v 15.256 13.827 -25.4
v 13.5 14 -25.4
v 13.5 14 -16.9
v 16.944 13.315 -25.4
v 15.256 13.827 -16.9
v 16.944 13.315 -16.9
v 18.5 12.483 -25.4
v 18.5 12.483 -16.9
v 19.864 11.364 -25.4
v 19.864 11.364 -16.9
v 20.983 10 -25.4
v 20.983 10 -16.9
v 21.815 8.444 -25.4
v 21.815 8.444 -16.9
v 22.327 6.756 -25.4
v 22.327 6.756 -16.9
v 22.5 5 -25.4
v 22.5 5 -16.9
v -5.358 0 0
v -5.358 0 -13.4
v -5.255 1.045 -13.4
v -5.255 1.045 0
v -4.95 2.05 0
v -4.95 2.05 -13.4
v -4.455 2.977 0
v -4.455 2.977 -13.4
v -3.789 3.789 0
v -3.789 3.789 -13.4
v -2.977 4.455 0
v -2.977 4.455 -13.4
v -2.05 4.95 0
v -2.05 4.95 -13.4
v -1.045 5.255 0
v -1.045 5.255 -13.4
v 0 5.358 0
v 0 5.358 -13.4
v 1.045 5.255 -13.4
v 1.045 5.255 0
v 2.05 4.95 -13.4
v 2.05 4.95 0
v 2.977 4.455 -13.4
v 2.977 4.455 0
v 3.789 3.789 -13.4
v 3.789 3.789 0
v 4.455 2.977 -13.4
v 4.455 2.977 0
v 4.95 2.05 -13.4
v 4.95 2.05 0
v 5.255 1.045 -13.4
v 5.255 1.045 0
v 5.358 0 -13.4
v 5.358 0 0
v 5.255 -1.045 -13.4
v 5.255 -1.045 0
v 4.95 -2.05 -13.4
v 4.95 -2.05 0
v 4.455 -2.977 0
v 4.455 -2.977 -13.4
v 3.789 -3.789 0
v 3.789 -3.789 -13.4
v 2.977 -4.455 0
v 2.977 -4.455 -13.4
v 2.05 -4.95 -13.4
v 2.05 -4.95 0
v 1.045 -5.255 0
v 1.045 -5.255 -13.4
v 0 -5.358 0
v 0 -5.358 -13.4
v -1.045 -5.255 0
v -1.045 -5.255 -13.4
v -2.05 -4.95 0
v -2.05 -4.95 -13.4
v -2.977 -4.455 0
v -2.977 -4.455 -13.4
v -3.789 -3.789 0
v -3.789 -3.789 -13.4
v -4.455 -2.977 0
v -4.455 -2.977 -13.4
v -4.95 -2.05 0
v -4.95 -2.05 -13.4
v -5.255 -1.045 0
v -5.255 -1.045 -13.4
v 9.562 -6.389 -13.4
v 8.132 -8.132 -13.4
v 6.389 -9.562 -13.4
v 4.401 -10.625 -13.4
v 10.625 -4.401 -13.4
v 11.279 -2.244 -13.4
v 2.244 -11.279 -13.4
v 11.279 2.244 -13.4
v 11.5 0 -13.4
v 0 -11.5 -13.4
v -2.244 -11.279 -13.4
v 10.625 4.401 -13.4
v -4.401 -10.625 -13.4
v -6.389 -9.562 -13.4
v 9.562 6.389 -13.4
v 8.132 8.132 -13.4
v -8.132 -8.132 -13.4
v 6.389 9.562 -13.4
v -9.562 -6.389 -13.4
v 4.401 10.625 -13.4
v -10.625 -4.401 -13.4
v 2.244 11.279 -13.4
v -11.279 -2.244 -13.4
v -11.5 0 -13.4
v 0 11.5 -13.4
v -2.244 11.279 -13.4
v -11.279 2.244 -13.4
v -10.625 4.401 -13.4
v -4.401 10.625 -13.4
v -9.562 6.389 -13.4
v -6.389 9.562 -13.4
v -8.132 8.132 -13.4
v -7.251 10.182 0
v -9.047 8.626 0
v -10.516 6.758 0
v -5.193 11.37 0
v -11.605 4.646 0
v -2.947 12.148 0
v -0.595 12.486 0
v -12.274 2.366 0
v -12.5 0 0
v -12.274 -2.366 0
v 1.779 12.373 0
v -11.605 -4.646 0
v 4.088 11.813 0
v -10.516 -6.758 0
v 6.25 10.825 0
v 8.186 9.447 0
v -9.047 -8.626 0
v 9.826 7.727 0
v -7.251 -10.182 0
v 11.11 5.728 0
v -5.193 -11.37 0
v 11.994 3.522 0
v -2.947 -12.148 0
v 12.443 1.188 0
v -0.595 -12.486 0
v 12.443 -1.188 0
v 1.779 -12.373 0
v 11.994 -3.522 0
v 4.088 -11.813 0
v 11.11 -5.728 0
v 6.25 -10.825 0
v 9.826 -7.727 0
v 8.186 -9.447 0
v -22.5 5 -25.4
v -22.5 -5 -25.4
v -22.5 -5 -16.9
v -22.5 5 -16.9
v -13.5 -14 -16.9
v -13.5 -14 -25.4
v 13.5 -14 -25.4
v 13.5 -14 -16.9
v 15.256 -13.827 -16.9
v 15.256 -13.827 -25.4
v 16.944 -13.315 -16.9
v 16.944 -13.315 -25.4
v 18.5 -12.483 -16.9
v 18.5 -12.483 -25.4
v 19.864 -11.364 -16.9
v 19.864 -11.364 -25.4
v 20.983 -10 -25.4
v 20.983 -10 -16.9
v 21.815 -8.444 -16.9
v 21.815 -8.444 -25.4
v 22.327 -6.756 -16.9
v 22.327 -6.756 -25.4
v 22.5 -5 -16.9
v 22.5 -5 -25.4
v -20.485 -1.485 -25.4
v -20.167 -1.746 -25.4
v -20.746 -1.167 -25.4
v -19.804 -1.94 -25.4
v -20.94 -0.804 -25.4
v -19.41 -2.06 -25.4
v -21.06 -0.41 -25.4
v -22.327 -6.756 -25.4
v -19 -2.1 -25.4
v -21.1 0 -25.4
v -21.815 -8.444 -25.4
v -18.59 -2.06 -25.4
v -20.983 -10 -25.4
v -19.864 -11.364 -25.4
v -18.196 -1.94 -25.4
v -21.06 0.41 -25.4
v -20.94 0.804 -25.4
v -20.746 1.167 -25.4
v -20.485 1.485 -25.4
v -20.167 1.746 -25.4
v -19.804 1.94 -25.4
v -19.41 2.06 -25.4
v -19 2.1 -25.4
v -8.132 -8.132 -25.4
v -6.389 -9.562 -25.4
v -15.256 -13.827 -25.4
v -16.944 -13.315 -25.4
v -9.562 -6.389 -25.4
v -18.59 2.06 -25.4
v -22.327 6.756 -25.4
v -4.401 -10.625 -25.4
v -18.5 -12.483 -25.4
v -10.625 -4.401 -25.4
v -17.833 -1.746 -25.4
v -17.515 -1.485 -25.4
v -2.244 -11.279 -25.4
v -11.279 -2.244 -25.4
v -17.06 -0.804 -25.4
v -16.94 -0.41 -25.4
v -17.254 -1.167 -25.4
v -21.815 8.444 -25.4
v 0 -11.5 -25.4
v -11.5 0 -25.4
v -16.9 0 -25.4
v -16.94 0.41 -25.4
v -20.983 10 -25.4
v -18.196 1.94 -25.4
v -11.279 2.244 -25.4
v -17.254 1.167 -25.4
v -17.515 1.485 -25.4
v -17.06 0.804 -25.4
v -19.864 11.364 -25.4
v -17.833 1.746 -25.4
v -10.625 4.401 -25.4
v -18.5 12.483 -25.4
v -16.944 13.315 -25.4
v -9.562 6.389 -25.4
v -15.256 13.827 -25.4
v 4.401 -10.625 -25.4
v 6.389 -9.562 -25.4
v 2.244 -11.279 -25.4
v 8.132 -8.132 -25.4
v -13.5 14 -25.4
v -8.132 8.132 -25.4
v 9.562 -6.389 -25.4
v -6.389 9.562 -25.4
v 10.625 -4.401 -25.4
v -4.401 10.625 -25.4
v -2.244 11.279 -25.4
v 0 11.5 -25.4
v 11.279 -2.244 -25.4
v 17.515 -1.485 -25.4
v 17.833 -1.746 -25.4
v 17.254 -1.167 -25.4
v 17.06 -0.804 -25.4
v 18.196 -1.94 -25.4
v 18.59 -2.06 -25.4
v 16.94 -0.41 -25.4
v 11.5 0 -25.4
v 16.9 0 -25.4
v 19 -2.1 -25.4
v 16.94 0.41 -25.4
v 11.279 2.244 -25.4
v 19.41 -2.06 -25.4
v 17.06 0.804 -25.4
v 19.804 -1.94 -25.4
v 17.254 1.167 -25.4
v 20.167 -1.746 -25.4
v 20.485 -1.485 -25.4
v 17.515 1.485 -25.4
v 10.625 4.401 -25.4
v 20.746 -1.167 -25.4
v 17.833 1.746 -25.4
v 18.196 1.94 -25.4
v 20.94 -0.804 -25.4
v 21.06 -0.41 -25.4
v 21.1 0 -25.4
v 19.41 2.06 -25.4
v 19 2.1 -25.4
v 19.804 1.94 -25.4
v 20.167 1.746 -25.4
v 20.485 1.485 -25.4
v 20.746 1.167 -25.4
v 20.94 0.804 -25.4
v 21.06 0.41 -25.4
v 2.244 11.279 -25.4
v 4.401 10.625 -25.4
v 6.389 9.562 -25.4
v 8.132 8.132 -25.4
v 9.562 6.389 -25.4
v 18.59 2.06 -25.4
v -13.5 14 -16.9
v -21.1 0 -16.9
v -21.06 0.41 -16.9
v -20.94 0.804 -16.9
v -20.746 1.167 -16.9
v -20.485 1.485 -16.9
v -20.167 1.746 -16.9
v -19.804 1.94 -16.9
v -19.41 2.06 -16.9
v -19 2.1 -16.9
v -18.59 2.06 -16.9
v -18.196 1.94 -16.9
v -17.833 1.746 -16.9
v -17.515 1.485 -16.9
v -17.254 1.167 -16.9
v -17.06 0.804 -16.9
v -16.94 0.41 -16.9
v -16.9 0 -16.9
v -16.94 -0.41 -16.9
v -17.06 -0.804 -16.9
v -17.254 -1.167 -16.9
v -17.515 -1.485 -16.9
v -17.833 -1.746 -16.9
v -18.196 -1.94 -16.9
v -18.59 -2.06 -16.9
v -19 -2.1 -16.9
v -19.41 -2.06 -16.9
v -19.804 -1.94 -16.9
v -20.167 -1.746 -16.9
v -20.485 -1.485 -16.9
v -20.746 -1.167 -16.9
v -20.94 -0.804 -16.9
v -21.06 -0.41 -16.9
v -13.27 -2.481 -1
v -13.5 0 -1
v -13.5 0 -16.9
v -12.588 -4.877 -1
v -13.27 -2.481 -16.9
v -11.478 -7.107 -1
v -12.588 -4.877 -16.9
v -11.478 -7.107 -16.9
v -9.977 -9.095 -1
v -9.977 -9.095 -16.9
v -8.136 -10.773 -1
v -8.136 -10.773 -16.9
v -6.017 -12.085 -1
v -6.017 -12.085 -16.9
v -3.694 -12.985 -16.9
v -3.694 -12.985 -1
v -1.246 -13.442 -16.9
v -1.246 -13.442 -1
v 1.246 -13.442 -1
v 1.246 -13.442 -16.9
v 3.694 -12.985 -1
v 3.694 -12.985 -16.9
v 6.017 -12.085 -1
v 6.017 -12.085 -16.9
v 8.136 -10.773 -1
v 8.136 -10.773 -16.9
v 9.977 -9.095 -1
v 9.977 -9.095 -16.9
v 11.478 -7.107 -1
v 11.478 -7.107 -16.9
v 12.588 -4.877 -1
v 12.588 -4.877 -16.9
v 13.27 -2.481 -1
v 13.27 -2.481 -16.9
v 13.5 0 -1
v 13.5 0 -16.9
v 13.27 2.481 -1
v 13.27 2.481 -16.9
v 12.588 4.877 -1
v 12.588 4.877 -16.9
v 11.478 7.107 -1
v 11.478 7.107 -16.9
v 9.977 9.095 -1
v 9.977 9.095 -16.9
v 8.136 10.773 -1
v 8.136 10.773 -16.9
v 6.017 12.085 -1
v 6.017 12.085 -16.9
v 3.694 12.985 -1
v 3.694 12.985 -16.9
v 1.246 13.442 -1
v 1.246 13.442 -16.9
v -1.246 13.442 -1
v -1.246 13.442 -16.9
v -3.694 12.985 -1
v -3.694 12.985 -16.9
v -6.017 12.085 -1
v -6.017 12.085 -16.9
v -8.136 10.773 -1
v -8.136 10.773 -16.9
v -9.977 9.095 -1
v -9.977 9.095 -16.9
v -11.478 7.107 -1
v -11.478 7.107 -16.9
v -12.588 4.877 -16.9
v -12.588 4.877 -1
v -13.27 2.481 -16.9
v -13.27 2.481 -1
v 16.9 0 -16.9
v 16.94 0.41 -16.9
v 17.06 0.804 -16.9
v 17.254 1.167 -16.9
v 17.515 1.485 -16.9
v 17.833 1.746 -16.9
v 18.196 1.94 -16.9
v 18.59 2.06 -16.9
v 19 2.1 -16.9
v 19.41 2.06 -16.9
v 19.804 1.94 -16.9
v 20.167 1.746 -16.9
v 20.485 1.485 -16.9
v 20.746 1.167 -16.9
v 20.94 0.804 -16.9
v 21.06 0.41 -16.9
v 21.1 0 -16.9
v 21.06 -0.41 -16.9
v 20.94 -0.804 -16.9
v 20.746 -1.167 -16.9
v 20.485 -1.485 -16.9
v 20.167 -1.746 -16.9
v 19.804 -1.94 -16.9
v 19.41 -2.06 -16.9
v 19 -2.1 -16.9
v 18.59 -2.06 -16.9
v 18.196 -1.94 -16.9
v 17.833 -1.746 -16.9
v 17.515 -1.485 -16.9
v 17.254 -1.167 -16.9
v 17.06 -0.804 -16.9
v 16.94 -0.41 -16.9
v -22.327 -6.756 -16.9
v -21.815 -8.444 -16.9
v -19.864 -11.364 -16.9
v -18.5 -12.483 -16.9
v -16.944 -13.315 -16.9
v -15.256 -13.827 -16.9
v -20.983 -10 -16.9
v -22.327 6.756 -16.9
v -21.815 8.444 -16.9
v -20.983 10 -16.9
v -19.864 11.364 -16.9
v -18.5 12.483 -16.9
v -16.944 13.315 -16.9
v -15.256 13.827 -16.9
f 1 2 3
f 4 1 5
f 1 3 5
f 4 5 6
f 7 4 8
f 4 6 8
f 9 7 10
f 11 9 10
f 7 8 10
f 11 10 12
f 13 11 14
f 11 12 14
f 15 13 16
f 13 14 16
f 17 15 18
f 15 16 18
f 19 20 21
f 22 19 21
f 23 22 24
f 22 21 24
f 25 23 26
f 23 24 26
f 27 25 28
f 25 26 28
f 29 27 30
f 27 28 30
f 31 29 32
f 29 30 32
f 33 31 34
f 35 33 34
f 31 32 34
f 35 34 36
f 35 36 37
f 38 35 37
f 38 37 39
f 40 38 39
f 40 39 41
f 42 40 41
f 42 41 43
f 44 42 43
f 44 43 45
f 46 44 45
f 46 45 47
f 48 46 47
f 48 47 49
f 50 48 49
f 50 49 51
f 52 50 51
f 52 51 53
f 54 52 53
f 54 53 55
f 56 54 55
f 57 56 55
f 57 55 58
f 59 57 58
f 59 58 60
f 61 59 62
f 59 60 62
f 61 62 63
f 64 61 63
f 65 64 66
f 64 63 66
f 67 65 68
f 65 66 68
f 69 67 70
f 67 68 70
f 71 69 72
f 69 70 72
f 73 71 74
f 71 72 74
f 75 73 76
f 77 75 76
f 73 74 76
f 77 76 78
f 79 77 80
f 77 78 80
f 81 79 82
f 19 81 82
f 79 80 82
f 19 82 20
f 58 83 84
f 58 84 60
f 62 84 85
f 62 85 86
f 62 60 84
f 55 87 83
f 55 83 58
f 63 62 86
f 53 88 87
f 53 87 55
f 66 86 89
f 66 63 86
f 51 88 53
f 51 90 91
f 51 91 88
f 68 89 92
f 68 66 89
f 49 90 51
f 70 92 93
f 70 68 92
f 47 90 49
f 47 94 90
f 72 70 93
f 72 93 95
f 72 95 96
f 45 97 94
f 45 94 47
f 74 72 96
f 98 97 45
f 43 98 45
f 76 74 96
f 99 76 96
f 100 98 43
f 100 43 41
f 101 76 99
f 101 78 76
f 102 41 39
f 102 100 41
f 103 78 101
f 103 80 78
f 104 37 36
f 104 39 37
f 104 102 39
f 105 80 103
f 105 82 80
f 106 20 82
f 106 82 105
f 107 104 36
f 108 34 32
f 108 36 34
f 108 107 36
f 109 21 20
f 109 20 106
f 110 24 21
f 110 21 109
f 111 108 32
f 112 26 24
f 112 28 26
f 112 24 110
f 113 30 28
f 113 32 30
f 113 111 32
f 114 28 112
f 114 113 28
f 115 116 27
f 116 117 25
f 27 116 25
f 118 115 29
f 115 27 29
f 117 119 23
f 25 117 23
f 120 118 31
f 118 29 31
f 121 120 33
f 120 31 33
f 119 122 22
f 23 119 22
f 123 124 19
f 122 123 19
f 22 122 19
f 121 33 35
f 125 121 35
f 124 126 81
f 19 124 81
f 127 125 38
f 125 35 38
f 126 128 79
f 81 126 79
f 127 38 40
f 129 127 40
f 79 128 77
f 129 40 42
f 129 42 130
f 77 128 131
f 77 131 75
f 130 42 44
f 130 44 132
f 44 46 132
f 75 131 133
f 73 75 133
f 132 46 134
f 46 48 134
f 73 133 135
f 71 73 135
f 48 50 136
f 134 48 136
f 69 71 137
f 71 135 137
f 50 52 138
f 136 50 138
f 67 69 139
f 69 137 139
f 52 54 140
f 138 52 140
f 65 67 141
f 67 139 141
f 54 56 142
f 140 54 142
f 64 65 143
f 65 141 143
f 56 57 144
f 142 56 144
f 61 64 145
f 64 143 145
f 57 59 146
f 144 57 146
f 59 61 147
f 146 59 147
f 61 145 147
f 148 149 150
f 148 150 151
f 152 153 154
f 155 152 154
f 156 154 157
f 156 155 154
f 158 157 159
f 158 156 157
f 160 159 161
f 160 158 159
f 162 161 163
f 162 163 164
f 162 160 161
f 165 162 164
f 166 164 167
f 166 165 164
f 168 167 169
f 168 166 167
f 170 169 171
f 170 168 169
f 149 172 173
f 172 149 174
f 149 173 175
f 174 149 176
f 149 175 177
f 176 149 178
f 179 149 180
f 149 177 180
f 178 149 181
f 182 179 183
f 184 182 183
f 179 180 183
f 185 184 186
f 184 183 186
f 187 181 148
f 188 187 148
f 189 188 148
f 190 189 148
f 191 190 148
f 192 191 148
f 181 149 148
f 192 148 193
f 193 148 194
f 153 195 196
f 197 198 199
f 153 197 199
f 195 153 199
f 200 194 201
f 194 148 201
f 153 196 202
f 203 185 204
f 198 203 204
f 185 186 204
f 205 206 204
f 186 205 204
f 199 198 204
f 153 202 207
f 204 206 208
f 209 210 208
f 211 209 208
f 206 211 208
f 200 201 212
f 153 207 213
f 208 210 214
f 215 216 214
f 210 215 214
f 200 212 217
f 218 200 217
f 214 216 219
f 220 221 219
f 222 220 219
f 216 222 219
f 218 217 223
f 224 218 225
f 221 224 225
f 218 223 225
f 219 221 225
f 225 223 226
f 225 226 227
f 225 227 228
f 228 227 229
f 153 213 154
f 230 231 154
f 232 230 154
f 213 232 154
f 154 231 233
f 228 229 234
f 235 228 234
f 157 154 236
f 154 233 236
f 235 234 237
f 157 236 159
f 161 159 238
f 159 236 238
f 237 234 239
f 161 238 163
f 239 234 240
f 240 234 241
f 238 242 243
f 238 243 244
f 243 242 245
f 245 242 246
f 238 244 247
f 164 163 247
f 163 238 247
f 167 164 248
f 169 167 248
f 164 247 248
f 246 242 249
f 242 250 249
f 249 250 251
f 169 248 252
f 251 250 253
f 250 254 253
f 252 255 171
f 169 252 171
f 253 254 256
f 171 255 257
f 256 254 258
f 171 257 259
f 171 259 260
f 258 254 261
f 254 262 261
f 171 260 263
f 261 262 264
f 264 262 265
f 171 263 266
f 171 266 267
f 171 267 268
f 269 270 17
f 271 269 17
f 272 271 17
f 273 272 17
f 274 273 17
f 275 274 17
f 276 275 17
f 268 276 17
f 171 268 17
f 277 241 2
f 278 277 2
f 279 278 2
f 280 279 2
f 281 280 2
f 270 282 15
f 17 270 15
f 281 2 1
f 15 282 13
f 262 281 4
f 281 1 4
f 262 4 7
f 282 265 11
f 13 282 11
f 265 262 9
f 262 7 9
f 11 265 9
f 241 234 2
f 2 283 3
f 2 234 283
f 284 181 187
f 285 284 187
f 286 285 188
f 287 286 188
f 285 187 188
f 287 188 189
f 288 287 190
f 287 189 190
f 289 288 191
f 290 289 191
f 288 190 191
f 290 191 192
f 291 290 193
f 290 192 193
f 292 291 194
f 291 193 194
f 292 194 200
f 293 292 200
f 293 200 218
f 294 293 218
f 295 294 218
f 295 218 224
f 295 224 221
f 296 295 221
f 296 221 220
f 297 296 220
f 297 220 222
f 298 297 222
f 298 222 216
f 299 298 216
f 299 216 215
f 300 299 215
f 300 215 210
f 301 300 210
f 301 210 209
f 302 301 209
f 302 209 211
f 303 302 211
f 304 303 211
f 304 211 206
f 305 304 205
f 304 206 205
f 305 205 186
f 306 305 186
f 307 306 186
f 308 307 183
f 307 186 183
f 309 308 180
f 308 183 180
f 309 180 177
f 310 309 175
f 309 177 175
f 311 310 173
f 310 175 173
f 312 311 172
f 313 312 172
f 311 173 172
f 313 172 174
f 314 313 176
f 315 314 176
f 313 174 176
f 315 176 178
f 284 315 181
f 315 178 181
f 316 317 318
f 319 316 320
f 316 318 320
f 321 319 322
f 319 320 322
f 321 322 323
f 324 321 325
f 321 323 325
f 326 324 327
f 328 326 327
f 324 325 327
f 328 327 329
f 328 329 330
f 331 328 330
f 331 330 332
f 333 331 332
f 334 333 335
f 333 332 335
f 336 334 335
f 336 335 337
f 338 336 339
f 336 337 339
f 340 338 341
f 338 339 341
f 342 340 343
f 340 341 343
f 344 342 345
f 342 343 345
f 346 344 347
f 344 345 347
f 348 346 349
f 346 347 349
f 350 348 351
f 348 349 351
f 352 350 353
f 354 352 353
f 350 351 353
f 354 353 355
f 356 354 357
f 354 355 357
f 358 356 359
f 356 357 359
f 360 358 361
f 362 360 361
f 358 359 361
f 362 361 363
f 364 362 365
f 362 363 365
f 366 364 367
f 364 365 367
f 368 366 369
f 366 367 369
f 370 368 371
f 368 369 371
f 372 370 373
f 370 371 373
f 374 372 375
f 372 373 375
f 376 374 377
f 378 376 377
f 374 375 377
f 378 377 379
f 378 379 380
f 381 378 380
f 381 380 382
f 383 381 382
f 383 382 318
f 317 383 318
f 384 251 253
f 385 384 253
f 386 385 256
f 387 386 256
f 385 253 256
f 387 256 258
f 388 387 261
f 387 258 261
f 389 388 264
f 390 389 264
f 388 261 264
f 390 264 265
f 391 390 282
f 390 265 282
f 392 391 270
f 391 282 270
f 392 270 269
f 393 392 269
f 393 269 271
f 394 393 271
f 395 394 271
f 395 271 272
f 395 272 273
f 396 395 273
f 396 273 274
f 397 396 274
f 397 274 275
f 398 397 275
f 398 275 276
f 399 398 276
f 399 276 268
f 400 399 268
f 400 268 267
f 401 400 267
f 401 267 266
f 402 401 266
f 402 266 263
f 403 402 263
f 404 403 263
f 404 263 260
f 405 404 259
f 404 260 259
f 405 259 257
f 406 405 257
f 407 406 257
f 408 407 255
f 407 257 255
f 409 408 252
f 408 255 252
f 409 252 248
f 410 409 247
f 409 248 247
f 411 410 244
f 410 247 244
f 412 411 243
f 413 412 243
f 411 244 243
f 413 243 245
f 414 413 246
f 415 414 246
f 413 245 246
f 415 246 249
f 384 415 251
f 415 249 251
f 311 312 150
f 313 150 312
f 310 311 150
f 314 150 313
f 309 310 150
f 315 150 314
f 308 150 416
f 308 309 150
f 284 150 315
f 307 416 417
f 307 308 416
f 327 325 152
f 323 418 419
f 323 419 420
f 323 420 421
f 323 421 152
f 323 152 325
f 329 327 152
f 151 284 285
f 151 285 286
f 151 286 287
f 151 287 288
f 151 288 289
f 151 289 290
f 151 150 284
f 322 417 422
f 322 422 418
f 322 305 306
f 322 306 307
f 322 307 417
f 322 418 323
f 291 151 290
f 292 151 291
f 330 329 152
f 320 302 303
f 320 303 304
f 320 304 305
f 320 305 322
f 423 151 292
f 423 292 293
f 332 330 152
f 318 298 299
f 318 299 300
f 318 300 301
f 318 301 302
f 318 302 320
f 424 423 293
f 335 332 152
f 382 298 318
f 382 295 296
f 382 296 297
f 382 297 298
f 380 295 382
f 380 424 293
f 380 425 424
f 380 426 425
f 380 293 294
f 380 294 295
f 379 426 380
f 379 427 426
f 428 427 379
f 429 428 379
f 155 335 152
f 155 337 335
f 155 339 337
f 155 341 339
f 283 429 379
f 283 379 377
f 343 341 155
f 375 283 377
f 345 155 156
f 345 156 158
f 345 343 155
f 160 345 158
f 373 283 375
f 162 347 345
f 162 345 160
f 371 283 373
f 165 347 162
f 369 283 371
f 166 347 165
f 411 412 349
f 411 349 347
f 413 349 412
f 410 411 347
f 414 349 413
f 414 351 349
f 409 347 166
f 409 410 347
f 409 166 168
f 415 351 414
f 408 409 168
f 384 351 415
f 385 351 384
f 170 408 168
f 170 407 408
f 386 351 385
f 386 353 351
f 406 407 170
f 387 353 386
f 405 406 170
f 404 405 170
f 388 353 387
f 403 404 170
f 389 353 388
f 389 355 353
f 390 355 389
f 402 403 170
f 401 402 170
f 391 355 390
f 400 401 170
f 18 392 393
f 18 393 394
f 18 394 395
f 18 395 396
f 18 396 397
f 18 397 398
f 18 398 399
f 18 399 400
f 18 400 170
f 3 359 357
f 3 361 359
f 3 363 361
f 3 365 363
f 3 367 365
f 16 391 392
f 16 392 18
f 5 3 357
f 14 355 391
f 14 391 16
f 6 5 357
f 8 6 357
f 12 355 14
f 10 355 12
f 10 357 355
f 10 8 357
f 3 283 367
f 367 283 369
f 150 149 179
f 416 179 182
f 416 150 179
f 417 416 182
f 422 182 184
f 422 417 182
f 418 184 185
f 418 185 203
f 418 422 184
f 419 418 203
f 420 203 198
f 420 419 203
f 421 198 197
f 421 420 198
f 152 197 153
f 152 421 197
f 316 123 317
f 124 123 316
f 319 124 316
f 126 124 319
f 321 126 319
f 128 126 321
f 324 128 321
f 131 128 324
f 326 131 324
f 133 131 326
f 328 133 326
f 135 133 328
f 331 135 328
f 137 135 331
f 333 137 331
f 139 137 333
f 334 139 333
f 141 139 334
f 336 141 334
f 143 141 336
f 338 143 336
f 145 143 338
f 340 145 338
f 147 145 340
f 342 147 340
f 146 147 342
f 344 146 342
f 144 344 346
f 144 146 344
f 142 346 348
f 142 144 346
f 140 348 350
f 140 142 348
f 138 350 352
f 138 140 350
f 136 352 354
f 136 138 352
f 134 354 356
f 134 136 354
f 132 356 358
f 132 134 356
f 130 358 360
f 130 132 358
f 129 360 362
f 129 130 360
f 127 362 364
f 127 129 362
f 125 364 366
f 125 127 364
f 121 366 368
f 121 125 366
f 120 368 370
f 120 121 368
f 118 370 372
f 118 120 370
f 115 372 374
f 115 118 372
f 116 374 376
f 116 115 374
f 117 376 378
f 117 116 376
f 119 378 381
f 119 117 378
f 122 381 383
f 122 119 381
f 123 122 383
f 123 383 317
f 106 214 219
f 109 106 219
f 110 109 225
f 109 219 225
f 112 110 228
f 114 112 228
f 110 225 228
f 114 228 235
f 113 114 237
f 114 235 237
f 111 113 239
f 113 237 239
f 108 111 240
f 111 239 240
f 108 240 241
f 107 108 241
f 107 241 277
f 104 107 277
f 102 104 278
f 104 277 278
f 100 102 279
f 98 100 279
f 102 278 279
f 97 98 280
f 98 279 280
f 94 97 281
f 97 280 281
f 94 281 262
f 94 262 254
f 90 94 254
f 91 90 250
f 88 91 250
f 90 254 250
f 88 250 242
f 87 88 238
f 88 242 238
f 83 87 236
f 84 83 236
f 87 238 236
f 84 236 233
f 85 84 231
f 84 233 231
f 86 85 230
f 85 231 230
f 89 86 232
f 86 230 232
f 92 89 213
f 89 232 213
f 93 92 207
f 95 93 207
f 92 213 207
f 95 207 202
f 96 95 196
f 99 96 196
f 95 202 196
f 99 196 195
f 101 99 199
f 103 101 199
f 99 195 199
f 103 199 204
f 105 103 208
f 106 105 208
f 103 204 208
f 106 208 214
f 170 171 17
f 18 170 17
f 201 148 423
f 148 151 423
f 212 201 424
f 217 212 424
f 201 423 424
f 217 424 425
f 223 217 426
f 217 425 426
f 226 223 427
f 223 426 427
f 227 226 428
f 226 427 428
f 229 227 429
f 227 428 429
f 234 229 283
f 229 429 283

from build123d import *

# Parameters (mm, degrees)
F_1_2_13_TAPPED_HOLE1_D     = 10.71626
BOSS_EXTRUDE1_START         = -8.5
SKETCH9_W                   = 45
SKETCH9_H                   = 28
SKETCH9_R                   = 13.5
BOSS_EXTRUDE1_DEPTH         = 8.5
TAP_DRILL_FOR_M5X0_8_TAP1_D = 4.2
FILLET1_R                   = 9
CHAMFER1_SIZE               = 1
SKETCH8_R                   = 11.5
CUT_EXTRUDE2_DEPTH          = 12


with BuildPart() as part:
    # Sketch2 → Revolve1 (revolve)
    with BuildSketch(Plane(origin=(0, 0, 0), x_dir=(0, 0, -1), z_dir=(1, 0, 0)), mode=Mode.PRIVATE) as revolve1_sk:
        Polygon((0, 13.5), (16.9, 13.5), (16.9, 14), (25.4, 14), (25.4, 0), (0, 0), align=None)
    revolve(revolve1_sk.sketch.rotate(Axis((0, 0, 0), (0, 0, 1)), 90), axis=Axis((0, 0, 0), (0, 0, 1)))

    # 1/2-13 Tapped Hole1 (through all)
    with Locations(Plane.XY):
        with Locations((0, 0)):
            Hole(F_1_2_13_TAPPED_HOLE1_D / 2)

    # Sketch9 → Boss-Extrude1 (add)
    with BuildSketch(Plane.XY.offset(-16.9).offset(BOSS_EXTRUDE1_START)):
        Rectangle(SKETCH9_W, SKETCH9_H)
        with Locations(Location((0, 0, 0), (0, 0, 180))):
            Circle(SKETCH9_R, mode=Mode.SUBTRACT)
    extrude(amount=BOSS_EXTRUDE1_DEPTH)

    # Tap Drill for M5x0.8 Tap1 (through all)
    with Locations(Plane.XY.offset(-16.9)):
        with Locations((-19, 0), (19, 0)):
            Hole(TAP_DRILL_FOR_M5X0_8_TAP1_D / 2)

    # Fillet1
    fillet1_edges = [part.edges().sort_by_distance(p)[0] for p in [
        (-22.5, 14, -21.15),
        (22.5, -14, -21.15),
        (-22.5, -14, -21.15),
        (22.5, 14, -21.15),
    ]]
    fillet(fillet1_edges, radius=FILLET1_R)

    # Chamfer1
    chamfer1_edges = [part.edges().sort_by_distance(p)[0] for p in [
        (13.5, 0, 0),
    ]]
    chamfer(chamfer1_edges, length=CHAMFER1_SIZE)

    # Sketch8 → Cut-Extrude2 (cut)
    with BuildSketch(Plane(origin=(0, 0, -25.4), x_dir=(-1, 0, 0), z_dir=(0, 0, -1))):
        Circle(SKETCH8_R)
    extrude(amount=-CUT_EXTRUDE2_DEPTH, mode=Mode.SUBTRACT)


solid = part.part
